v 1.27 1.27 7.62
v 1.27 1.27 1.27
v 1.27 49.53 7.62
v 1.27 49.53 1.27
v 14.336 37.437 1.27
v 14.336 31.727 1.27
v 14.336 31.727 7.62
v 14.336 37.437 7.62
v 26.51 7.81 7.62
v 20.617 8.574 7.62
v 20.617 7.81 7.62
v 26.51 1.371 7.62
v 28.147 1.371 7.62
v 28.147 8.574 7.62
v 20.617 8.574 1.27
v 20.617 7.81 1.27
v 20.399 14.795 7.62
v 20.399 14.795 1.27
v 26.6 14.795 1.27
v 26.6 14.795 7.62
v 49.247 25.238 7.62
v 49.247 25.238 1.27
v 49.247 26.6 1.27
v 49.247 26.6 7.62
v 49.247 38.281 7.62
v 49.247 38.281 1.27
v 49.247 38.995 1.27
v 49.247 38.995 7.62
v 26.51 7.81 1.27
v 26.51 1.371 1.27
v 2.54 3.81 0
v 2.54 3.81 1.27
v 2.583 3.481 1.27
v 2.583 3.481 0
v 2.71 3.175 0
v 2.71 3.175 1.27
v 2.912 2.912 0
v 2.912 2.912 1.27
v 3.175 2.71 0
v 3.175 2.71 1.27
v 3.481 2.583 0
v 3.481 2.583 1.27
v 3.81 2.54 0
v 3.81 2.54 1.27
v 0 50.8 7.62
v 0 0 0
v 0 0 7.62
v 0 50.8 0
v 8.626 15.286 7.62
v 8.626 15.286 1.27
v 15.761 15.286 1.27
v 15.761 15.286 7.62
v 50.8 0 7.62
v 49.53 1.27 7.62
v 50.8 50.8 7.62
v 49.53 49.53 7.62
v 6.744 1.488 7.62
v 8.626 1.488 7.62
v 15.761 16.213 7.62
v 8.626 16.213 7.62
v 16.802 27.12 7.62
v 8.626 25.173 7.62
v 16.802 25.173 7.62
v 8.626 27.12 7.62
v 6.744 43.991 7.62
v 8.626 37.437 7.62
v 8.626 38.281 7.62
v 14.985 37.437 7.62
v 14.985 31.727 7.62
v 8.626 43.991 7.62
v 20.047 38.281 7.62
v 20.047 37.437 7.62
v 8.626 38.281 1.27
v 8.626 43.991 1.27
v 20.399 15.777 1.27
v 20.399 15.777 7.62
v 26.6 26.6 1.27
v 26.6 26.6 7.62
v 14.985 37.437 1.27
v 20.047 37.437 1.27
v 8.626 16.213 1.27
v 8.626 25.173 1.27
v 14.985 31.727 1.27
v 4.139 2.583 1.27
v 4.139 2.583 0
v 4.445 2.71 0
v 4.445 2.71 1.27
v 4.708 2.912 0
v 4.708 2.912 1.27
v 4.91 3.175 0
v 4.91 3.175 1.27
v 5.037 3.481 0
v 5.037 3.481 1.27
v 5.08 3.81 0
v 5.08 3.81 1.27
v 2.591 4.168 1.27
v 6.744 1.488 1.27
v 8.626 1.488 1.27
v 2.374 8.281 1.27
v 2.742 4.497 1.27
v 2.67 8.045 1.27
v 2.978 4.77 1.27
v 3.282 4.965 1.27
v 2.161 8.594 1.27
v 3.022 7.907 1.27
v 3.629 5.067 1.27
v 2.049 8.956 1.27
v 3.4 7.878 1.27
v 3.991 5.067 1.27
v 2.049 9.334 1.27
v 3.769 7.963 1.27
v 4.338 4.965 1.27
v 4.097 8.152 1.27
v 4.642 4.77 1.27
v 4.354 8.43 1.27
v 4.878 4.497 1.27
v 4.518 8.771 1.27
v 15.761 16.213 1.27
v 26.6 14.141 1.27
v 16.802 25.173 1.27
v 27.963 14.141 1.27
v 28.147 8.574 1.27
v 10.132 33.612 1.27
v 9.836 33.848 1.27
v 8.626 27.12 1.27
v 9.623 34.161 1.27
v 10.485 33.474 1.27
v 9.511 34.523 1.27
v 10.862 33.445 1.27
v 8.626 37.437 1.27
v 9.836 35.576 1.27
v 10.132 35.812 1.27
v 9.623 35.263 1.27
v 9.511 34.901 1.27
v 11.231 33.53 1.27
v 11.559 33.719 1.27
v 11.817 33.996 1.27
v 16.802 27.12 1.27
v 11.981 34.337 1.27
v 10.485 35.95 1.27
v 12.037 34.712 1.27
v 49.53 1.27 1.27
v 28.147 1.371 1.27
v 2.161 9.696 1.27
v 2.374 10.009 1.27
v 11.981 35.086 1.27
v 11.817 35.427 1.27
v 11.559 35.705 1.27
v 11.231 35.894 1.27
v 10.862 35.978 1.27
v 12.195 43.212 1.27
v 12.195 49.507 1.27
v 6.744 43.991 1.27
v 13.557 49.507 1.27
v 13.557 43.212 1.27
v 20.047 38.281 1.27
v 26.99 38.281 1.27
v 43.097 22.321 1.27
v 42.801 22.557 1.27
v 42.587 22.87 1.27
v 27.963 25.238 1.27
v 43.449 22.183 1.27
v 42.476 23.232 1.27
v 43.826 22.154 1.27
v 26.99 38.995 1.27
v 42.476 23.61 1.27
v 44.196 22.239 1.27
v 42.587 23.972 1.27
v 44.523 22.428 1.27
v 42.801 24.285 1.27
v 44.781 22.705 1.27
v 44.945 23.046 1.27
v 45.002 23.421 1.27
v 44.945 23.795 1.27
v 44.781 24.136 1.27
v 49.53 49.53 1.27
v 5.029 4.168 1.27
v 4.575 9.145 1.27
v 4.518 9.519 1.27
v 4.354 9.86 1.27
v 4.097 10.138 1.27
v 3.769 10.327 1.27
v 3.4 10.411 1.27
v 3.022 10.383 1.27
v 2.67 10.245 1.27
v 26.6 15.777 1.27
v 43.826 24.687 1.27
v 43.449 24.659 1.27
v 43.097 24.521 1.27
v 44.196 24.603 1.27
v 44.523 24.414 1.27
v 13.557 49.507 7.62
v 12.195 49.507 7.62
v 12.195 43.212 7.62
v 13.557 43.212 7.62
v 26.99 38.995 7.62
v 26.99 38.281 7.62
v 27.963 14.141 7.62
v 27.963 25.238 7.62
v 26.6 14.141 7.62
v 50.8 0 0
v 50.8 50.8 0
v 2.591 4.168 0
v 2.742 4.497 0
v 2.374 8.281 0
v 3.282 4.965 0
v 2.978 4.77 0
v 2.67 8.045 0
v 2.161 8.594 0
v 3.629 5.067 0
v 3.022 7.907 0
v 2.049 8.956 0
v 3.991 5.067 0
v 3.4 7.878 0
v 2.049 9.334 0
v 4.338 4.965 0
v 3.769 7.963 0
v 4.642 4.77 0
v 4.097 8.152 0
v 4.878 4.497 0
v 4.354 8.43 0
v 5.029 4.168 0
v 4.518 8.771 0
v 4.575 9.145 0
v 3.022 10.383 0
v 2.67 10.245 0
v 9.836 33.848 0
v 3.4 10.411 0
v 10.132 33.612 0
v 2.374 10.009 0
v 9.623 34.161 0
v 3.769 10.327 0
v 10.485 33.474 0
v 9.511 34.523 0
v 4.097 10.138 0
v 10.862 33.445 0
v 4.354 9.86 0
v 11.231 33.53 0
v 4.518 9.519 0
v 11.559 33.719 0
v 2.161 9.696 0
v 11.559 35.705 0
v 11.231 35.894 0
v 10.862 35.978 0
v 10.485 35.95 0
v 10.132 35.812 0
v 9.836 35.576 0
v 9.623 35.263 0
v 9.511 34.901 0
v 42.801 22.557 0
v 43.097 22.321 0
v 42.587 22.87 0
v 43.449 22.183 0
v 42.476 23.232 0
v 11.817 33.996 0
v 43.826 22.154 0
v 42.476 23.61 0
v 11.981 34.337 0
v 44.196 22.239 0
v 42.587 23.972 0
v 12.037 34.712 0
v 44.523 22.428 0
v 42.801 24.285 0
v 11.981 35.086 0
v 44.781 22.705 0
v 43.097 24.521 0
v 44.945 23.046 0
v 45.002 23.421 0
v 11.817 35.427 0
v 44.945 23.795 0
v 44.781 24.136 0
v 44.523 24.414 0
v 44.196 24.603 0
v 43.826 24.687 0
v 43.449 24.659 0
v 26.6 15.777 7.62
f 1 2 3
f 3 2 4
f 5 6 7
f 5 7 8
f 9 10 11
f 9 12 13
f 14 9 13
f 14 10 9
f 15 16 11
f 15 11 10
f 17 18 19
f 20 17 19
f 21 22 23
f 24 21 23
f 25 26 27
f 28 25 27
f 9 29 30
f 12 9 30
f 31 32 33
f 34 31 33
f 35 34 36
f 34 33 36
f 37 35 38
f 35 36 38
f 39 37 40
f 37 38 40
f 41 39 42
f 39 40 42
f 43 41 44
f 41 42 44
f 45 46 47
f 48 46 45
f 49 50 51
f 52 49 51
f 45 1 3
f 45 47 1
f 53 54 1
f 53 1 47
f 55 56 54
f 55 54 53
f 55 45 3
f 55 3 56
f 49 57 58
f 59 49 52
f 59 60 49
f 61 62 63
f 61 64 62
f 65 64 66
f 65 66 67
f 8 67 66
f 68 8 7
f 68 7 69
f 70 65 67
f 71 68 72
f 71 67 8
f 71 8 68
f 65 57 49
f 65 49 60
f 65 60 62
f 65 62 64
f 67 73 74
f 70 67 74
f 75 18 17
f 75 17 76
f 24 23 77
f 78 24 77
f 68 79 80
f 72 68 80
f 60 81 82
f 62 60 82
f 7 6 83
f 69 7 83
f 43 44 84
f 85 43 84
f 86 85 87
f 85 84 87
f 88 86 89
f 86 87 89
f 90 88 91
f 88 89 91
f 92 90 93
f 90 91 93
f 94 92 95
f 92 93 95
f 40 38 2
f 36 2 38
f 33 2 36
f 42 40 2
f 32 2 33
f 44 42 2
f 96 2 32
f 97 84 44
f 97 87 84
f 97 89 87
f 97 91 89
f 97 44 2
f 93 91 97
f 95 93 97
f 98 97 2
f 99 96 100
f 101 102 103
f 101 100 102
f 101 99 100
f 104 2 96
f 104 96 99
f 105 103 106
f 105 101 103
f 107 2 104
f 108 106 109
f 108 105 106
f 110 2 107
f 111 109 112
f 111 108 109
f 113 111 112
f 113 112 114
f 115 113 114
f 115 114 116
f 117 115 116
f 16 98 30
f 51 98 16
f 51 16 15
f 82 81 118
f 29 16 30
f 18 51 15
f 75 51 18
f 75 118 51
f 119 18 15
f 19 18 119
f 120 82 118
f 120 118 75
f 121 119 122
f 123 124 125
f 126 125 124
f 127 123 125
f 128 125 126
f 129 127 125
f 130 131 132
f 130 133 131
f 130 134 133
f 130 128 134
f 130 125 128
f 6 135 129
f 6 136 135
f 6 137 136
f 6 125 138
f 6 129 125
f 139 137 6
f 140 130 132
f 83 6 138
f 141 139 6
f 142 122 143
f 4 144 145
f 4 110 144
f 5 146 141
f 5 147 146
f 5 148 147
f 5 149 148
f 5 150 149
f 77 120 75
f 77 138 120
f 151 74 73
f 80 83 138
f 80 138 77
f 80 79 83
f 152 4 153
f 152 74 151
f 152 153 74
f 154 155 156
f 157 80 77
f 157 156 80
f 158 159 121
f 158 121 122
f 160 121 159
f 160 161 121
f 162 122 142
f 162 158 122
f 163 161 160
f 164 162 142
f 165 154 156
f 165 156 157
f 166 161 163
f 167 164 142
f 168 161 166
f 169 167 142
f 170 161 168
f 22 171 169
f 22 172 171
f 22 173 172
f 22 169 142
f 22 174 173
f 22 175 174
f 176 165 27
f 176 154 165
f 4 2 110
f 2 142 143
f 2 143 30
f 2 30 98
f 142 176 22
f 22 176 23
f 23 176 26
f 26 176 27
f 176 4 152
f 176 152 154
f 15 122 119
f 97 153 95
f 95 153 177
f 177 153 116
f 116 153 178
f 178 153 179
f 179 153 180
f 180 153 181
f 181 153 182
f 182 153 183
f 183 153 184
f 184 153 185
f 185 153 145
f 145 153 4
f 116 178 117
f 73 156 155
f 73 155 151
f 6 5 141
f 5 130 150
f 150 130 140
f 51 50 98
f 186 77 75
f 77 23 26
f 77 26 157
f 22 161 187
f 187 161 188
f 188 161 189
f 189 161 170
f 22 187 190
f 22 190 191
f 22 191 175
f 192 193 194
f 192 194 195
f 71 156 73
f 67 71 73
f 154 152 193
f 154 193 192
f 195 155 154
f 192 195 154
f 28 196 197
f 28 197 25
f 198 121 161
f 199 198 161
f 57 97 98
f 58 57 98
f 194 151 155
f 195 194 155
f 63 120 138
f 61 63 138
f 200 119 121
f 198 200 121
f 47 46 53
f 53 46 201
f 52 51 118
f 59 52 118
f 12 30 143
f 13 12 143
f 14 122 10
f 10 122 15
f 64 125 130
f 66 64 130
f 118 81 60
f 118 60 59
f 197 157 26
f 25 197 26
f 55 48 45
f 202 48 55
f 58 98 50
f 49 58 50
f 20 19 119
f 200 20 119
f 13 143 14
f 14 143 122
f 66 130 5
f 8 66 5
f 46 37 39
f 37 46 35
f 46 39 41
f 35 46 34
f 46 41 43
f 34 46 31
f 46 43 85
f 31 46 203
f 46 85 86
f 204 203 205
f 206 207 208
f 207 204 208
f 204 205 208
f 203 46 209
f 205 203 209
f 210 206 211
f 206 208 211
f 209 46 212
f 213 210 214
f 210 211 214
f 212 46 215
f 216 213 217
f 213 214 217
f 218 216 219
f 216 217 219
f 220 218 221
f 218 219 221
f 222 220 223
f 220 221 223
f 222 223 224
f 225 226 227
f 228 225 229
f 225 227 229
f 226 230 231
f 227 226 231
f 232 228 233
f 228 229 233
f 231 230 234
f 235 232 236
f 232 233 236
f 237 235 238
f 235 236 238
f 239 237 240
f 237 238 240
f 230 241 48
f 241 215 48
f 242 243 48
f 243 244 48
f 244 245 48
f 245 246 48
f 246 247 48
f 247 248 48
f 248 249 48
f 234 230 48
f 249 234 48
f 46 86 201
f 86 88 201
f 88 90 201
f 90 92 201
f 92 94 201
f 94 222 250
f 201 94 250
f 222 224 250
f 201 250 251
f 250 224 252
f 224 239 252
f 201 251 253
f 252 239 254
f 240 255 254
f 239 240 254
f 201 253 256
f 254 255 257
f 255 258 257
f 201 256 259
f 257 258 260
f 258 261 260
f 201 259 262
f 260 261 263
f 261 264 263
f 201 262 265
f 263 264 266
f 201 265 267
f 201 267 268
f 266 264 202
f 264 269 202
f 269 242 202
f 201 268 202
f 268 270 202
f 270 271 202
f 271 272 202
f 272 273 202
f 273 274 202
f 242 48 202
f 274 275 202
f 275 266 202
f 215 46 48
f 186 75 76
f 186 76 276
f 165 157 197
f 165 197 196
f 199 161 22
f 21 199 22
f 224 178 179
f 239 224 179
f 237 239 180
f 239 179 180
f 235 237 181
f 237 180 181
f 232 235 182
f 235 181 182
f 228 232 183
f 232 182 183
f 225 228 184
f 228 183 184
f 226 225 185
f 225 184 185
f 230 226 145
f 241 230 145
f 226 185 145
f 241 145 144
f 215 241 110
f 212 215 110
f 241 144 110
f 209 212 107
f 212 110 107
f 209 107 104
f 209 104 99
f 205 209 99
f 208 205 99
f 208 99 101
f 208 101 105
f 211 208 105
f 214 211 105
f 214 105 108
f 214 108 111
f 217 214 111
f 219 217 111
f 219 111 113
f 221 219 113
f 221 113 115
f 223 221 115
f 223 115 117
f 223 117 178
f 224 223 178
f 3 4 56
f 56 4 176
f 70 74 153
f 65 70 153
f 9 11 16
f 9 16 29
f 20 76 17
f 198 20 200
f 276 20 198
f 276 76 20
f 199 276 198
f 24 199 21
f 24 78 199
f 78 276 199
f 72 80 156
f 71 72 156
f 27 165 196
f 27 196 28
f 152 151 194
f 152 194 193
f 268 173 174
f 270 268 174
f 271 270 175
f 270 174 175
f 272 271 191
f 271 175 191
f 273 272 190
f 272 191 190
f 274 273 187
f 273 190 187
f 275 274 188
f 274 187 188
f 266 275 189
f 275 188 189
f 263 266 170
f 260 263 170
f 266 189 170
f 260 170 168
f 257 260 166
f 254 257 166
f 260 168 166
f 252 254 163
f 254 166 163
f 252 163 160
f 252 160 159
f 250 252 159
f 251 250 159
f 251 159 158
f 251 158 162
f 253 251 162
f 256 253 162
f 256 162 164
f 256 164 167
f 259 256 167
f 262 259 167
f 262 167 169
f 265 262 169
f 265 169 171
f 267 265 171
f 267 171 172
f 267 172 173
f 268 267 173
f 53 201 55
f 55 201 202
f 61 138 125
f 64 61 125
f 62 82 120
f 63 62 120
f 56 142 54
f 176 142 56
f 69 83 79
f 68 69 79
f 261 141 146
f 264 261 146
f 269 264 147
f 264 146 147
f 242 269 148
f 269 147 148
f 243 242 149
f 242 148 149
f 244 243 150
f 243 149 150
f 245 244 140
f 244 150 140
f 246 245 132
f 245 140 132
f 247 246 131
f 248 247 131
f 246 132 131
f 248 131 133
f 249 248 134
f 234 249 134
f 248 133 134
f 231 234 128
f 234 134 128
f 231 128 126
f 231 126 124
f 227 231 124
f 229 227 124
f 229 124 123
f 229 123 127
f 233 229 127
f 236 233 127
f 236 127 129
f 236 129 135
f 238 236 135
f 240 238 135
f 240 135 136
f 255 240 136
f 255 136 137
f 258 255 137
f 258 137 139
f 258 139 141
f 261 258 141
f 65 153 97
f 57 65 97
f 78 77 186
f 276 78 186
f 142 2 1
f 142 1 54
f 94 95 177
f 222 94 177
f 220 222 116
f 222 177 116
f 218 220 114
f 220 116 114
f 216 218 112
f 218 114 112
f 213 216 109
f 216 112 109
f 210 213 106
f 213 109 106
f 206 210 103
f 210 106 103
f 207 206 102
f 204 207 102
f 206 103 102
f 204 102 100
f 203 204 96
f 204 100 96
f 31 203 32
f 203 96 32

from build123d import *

# Parameters (mm, degrees)
F0_W      = 50.8
F0_H      = 50.8
F1_DEPTH  = 7.62
F2_T      = -1.27
F4_DEPTH  = 25.4
F5_DEPTH  = 6.35
F6_DEPTH  = 25.4
F8_DEPTH  = 6.35
F7_W      = 7.134902291
F7_H      = 0.9276261553
F7_W_2    = 0.6489050575
F7_H_2    = 5.7103633881
F7_R      = 1.27
F7_W_3    = 1.3627009466
F7_H_3    = 6.2943808734
F7_W_4    = 22.2574435174
F7_H_4    = 0.7137954235
F7_W_5    = 21.2840866297
F7_H_5    = 1.362701878
F7_W_6    = 6.2016416341
F7_H_6    = 0.982192345
F7_W_7    = 5.8931484818
F7_H_7    = 0.7639275864
F9_DEPTH  = 6.35
F10_DEPTH = 25.4
F11_DEPTH = 25.4


# Not quite as in the source:
# - a feature names something its author has since deleted; it is built from what else it names


with BuildPart() as f1:
    # F0 (on Top) → F1 (new body)
    with BuildSketch(Plane.XY):
        with Locations((25.4, 25.4)):
            Rectangle(F0_W, F0_H)
    extrude(amount=F1_DEPTH)

    # F2
    f2_openings = [f1.faces().sort_by_distance(p)[0] for p in [
        (25.4, 25.4, 7.62),
    ]]
    offset(amount=F2_T, openings=f2_openings)

    # F3 (on face) → F4 (cut)
    with BuildSketch(Plane.XY.offset(1.27)):
        with BuildLine():
            ThreePointArc((5.08, 3.81), (3.81, 5.08), (2.54, 3.81))
            Line((2.54, 3.81), (3.81, 3.81))
            Line((3.81, 3.81), (3.81, 2.54))
            ThreePointArc((3.81, 2.54), (4.7080256121, 2.9119743879), (5.08, 3.81))
        make_face()
        with BuildLine():
            Line((3.81, 3.81), (2.54, 3.81))
            ThreePointArc((2.54, 3.81), (2.9119743879, 2.9119743879), (3.81, 2.54))
            Line((3.81, 2.54), (3.81, 3.81))
        make_face()
    extrude(amount=-F4_DEPTH, mode=Mode.SUBTRACT)

    # F3 (on face) → F5 (cut)
    with BuildSketch(Plane.XY.offset(1.27)):
        with BuildLine():
            Line((1.27, 49.53), (1.27, 3.81))
            Line((1.27, 3.81), (2.54, 3.81))
            ThreePointArc((2.54, 3.81), (3.81, 5.08), (5.08, 3.81))
            ThreePointArc((5.08, 3.81), (4.7080256121, 2.9119743879), (3.81, 2.54))
            Line((3.81, 2.54), (3.81, 1.27))
            Line((3.81, 1.27), (49.53, 1.27))
            Line((49.53, 1.27), (49.53, 49.53))
            Line((49.53, 49.53), (1.27, 49.53))
        make_face()
    extrude(amount=F5_DEPTH, mode=Mode.SUBTRACT)

    # F3 (on face) → F6 (cut)
    with BuildSketch(Plane.XY.offset(1.27)):
        with BuildLine():
            ThreePointArc((5.08, 3.81), (3.81, 5.08), (2.54, 3.81))
            Line((2.54, 3.81), (3.81, 3.81))
            Line((3.81, 3.81), (3.81, 2.54))
            ThreePointArc((3.81, 2.54), (4.7080256121, 2.9119743879), (5.08, 3.81))
        make_face()
        with BuildLine():
            Line((3.81, 3.81), (2.54, 3.81))
            ThreePointArc((2.54, 3.81), (2.9119743879, 2.9119743879), (3.81, 2.54))
            Line((3.81, 2.54), (3.81, 3.81))
        make_face()
    extrude(amount=-F6_DEPTH, mode=Mode.SUBTRACT)

    # F7 (on face) → F8 (join)
    with BuildSketch(Plane.XY.offset(1.27)):
        Polygon((6.7439782433, 1.4878462534), (8.625802584, 1.4878462534), (8.625802584, 15.2857145295), (8.625802584, 16.2133406848), (8.625802584, 25.1728836447), (8.625802584, 27.1195974201), (8.625802584, 37.4371893704), (8.625802584, 38.2807664573), (8.625802584, 43.9911298454), (6.7439782433, 43.9911298454), align=None)
    extrude(amount=F8_DEPTH)

    # F7 (on face) → F9 (join)
    with BuildSketch(Plane.XY.offset(1.27)):
        Polygon((6.7439782433, 1.4878462534), (8.625802584, 1.4878462534), (8.625802584, 15.2857145295), (8.625802584, 16.2133406848), (8.625802584, 25.1728836447), (8.625802584, 27.1195974201), (8.625802584, 37.4371893704), (8.625802584, 38.2807664573), (8.625802584, 43.9911298454), (6.7439782433, 43.9911298454), align=None)
        with Locations((12.1932537295, 15.7495276071)):
            Rectangle(F7_W, F7_H)
        Polygon((8.625802584, 27.1195974201), (8.625802584, 25.1728836447), (16.8020073324, 25.1728836447), (16.8020073324, 25.9515698999), (16.8020073324, 27.1195974201), align=None)
        Polygon((20.0465321541, 38.2807664573), (8.625802584, 38.2807664573), (8.625802584, 37.4371893704), (14.336167369, 37.4371893704), (14.9850724265, 37.4371893704), (20.0465321541, 37.4371893704), align=None)
        with Locations((14.6606198978, 34.5820076764)):
            Rectangle(F7_W_2, F7_H_2)
        with Locations((10.7671897858, 34.7117893398)):
            Circle(F7_R)
        with Locations((3.3047813922, 9.144927375)):
            Circle(F7_R)
        with Locations((12.8761311062, 46.3596340269)):
            Rectangle(F7_W_3, F7_H_3)
        with Locations((38.118539378, 38.6376641691)):
            Rectangle(F7_W_4, F7_H_4)
        Polygon((27.963174507, 26.6004744917), (26.6004744917, 26.6004744917), (26.6004744917, 15.7768111676), (26.6004744917, 14.7946188226), (26.6004744917, 14.1414962709), (27.963174507, 14.1414962709), (27.963174507, 25.2377726138), align=None)
        with Locations((38.6052178219, 25.9191235527)):
            Rectangle(F7_W_5, F7_H_5)
        with Locations((23.4996536747, 15.2857149951)):
            Rectangle(F7_W_6, F7_H_6)
        with Locations((43.7315702438, 23.4208386391)):
            Circle(F7_R)
        Polygon((28.1472336501, 8.5740732029), (26.510246098, 8.5740732029), (26.510246098, 7.8101456165), (26.510246098, 1.3713347726), (28.1472336501, 1.3713347726), align=None)
        with Locations((23.5636718571, 8.1921094097)):
            Rectangle(F7_W_7, F7_H_7)
    extrude(amount=F9_DEPTH)

    # F10 (cut): faces of the model
    f10_faces = [f1.faces().sort_by_distance(p)[0] for p in [
        (10.7671897858, 34.7117893398, 7.62),
        (3.3047813922, 9.144927375, 7.62),
    ]]
    extrude(f10_faces, amount=-F10_DEPTH, mode=Mode.SUBTRACT)

    # F11 (cut): a face of the model
    f11_faces = [f1.faces().sort_by_distance(p)[0] for p in [
        (43.7315702438, 23.4208386391, 7.62),
    ]]
    extrude(f11_faces, amount=-F11_DEPTH, mode=Mode.SUBTRACT)


solid = f1.part
